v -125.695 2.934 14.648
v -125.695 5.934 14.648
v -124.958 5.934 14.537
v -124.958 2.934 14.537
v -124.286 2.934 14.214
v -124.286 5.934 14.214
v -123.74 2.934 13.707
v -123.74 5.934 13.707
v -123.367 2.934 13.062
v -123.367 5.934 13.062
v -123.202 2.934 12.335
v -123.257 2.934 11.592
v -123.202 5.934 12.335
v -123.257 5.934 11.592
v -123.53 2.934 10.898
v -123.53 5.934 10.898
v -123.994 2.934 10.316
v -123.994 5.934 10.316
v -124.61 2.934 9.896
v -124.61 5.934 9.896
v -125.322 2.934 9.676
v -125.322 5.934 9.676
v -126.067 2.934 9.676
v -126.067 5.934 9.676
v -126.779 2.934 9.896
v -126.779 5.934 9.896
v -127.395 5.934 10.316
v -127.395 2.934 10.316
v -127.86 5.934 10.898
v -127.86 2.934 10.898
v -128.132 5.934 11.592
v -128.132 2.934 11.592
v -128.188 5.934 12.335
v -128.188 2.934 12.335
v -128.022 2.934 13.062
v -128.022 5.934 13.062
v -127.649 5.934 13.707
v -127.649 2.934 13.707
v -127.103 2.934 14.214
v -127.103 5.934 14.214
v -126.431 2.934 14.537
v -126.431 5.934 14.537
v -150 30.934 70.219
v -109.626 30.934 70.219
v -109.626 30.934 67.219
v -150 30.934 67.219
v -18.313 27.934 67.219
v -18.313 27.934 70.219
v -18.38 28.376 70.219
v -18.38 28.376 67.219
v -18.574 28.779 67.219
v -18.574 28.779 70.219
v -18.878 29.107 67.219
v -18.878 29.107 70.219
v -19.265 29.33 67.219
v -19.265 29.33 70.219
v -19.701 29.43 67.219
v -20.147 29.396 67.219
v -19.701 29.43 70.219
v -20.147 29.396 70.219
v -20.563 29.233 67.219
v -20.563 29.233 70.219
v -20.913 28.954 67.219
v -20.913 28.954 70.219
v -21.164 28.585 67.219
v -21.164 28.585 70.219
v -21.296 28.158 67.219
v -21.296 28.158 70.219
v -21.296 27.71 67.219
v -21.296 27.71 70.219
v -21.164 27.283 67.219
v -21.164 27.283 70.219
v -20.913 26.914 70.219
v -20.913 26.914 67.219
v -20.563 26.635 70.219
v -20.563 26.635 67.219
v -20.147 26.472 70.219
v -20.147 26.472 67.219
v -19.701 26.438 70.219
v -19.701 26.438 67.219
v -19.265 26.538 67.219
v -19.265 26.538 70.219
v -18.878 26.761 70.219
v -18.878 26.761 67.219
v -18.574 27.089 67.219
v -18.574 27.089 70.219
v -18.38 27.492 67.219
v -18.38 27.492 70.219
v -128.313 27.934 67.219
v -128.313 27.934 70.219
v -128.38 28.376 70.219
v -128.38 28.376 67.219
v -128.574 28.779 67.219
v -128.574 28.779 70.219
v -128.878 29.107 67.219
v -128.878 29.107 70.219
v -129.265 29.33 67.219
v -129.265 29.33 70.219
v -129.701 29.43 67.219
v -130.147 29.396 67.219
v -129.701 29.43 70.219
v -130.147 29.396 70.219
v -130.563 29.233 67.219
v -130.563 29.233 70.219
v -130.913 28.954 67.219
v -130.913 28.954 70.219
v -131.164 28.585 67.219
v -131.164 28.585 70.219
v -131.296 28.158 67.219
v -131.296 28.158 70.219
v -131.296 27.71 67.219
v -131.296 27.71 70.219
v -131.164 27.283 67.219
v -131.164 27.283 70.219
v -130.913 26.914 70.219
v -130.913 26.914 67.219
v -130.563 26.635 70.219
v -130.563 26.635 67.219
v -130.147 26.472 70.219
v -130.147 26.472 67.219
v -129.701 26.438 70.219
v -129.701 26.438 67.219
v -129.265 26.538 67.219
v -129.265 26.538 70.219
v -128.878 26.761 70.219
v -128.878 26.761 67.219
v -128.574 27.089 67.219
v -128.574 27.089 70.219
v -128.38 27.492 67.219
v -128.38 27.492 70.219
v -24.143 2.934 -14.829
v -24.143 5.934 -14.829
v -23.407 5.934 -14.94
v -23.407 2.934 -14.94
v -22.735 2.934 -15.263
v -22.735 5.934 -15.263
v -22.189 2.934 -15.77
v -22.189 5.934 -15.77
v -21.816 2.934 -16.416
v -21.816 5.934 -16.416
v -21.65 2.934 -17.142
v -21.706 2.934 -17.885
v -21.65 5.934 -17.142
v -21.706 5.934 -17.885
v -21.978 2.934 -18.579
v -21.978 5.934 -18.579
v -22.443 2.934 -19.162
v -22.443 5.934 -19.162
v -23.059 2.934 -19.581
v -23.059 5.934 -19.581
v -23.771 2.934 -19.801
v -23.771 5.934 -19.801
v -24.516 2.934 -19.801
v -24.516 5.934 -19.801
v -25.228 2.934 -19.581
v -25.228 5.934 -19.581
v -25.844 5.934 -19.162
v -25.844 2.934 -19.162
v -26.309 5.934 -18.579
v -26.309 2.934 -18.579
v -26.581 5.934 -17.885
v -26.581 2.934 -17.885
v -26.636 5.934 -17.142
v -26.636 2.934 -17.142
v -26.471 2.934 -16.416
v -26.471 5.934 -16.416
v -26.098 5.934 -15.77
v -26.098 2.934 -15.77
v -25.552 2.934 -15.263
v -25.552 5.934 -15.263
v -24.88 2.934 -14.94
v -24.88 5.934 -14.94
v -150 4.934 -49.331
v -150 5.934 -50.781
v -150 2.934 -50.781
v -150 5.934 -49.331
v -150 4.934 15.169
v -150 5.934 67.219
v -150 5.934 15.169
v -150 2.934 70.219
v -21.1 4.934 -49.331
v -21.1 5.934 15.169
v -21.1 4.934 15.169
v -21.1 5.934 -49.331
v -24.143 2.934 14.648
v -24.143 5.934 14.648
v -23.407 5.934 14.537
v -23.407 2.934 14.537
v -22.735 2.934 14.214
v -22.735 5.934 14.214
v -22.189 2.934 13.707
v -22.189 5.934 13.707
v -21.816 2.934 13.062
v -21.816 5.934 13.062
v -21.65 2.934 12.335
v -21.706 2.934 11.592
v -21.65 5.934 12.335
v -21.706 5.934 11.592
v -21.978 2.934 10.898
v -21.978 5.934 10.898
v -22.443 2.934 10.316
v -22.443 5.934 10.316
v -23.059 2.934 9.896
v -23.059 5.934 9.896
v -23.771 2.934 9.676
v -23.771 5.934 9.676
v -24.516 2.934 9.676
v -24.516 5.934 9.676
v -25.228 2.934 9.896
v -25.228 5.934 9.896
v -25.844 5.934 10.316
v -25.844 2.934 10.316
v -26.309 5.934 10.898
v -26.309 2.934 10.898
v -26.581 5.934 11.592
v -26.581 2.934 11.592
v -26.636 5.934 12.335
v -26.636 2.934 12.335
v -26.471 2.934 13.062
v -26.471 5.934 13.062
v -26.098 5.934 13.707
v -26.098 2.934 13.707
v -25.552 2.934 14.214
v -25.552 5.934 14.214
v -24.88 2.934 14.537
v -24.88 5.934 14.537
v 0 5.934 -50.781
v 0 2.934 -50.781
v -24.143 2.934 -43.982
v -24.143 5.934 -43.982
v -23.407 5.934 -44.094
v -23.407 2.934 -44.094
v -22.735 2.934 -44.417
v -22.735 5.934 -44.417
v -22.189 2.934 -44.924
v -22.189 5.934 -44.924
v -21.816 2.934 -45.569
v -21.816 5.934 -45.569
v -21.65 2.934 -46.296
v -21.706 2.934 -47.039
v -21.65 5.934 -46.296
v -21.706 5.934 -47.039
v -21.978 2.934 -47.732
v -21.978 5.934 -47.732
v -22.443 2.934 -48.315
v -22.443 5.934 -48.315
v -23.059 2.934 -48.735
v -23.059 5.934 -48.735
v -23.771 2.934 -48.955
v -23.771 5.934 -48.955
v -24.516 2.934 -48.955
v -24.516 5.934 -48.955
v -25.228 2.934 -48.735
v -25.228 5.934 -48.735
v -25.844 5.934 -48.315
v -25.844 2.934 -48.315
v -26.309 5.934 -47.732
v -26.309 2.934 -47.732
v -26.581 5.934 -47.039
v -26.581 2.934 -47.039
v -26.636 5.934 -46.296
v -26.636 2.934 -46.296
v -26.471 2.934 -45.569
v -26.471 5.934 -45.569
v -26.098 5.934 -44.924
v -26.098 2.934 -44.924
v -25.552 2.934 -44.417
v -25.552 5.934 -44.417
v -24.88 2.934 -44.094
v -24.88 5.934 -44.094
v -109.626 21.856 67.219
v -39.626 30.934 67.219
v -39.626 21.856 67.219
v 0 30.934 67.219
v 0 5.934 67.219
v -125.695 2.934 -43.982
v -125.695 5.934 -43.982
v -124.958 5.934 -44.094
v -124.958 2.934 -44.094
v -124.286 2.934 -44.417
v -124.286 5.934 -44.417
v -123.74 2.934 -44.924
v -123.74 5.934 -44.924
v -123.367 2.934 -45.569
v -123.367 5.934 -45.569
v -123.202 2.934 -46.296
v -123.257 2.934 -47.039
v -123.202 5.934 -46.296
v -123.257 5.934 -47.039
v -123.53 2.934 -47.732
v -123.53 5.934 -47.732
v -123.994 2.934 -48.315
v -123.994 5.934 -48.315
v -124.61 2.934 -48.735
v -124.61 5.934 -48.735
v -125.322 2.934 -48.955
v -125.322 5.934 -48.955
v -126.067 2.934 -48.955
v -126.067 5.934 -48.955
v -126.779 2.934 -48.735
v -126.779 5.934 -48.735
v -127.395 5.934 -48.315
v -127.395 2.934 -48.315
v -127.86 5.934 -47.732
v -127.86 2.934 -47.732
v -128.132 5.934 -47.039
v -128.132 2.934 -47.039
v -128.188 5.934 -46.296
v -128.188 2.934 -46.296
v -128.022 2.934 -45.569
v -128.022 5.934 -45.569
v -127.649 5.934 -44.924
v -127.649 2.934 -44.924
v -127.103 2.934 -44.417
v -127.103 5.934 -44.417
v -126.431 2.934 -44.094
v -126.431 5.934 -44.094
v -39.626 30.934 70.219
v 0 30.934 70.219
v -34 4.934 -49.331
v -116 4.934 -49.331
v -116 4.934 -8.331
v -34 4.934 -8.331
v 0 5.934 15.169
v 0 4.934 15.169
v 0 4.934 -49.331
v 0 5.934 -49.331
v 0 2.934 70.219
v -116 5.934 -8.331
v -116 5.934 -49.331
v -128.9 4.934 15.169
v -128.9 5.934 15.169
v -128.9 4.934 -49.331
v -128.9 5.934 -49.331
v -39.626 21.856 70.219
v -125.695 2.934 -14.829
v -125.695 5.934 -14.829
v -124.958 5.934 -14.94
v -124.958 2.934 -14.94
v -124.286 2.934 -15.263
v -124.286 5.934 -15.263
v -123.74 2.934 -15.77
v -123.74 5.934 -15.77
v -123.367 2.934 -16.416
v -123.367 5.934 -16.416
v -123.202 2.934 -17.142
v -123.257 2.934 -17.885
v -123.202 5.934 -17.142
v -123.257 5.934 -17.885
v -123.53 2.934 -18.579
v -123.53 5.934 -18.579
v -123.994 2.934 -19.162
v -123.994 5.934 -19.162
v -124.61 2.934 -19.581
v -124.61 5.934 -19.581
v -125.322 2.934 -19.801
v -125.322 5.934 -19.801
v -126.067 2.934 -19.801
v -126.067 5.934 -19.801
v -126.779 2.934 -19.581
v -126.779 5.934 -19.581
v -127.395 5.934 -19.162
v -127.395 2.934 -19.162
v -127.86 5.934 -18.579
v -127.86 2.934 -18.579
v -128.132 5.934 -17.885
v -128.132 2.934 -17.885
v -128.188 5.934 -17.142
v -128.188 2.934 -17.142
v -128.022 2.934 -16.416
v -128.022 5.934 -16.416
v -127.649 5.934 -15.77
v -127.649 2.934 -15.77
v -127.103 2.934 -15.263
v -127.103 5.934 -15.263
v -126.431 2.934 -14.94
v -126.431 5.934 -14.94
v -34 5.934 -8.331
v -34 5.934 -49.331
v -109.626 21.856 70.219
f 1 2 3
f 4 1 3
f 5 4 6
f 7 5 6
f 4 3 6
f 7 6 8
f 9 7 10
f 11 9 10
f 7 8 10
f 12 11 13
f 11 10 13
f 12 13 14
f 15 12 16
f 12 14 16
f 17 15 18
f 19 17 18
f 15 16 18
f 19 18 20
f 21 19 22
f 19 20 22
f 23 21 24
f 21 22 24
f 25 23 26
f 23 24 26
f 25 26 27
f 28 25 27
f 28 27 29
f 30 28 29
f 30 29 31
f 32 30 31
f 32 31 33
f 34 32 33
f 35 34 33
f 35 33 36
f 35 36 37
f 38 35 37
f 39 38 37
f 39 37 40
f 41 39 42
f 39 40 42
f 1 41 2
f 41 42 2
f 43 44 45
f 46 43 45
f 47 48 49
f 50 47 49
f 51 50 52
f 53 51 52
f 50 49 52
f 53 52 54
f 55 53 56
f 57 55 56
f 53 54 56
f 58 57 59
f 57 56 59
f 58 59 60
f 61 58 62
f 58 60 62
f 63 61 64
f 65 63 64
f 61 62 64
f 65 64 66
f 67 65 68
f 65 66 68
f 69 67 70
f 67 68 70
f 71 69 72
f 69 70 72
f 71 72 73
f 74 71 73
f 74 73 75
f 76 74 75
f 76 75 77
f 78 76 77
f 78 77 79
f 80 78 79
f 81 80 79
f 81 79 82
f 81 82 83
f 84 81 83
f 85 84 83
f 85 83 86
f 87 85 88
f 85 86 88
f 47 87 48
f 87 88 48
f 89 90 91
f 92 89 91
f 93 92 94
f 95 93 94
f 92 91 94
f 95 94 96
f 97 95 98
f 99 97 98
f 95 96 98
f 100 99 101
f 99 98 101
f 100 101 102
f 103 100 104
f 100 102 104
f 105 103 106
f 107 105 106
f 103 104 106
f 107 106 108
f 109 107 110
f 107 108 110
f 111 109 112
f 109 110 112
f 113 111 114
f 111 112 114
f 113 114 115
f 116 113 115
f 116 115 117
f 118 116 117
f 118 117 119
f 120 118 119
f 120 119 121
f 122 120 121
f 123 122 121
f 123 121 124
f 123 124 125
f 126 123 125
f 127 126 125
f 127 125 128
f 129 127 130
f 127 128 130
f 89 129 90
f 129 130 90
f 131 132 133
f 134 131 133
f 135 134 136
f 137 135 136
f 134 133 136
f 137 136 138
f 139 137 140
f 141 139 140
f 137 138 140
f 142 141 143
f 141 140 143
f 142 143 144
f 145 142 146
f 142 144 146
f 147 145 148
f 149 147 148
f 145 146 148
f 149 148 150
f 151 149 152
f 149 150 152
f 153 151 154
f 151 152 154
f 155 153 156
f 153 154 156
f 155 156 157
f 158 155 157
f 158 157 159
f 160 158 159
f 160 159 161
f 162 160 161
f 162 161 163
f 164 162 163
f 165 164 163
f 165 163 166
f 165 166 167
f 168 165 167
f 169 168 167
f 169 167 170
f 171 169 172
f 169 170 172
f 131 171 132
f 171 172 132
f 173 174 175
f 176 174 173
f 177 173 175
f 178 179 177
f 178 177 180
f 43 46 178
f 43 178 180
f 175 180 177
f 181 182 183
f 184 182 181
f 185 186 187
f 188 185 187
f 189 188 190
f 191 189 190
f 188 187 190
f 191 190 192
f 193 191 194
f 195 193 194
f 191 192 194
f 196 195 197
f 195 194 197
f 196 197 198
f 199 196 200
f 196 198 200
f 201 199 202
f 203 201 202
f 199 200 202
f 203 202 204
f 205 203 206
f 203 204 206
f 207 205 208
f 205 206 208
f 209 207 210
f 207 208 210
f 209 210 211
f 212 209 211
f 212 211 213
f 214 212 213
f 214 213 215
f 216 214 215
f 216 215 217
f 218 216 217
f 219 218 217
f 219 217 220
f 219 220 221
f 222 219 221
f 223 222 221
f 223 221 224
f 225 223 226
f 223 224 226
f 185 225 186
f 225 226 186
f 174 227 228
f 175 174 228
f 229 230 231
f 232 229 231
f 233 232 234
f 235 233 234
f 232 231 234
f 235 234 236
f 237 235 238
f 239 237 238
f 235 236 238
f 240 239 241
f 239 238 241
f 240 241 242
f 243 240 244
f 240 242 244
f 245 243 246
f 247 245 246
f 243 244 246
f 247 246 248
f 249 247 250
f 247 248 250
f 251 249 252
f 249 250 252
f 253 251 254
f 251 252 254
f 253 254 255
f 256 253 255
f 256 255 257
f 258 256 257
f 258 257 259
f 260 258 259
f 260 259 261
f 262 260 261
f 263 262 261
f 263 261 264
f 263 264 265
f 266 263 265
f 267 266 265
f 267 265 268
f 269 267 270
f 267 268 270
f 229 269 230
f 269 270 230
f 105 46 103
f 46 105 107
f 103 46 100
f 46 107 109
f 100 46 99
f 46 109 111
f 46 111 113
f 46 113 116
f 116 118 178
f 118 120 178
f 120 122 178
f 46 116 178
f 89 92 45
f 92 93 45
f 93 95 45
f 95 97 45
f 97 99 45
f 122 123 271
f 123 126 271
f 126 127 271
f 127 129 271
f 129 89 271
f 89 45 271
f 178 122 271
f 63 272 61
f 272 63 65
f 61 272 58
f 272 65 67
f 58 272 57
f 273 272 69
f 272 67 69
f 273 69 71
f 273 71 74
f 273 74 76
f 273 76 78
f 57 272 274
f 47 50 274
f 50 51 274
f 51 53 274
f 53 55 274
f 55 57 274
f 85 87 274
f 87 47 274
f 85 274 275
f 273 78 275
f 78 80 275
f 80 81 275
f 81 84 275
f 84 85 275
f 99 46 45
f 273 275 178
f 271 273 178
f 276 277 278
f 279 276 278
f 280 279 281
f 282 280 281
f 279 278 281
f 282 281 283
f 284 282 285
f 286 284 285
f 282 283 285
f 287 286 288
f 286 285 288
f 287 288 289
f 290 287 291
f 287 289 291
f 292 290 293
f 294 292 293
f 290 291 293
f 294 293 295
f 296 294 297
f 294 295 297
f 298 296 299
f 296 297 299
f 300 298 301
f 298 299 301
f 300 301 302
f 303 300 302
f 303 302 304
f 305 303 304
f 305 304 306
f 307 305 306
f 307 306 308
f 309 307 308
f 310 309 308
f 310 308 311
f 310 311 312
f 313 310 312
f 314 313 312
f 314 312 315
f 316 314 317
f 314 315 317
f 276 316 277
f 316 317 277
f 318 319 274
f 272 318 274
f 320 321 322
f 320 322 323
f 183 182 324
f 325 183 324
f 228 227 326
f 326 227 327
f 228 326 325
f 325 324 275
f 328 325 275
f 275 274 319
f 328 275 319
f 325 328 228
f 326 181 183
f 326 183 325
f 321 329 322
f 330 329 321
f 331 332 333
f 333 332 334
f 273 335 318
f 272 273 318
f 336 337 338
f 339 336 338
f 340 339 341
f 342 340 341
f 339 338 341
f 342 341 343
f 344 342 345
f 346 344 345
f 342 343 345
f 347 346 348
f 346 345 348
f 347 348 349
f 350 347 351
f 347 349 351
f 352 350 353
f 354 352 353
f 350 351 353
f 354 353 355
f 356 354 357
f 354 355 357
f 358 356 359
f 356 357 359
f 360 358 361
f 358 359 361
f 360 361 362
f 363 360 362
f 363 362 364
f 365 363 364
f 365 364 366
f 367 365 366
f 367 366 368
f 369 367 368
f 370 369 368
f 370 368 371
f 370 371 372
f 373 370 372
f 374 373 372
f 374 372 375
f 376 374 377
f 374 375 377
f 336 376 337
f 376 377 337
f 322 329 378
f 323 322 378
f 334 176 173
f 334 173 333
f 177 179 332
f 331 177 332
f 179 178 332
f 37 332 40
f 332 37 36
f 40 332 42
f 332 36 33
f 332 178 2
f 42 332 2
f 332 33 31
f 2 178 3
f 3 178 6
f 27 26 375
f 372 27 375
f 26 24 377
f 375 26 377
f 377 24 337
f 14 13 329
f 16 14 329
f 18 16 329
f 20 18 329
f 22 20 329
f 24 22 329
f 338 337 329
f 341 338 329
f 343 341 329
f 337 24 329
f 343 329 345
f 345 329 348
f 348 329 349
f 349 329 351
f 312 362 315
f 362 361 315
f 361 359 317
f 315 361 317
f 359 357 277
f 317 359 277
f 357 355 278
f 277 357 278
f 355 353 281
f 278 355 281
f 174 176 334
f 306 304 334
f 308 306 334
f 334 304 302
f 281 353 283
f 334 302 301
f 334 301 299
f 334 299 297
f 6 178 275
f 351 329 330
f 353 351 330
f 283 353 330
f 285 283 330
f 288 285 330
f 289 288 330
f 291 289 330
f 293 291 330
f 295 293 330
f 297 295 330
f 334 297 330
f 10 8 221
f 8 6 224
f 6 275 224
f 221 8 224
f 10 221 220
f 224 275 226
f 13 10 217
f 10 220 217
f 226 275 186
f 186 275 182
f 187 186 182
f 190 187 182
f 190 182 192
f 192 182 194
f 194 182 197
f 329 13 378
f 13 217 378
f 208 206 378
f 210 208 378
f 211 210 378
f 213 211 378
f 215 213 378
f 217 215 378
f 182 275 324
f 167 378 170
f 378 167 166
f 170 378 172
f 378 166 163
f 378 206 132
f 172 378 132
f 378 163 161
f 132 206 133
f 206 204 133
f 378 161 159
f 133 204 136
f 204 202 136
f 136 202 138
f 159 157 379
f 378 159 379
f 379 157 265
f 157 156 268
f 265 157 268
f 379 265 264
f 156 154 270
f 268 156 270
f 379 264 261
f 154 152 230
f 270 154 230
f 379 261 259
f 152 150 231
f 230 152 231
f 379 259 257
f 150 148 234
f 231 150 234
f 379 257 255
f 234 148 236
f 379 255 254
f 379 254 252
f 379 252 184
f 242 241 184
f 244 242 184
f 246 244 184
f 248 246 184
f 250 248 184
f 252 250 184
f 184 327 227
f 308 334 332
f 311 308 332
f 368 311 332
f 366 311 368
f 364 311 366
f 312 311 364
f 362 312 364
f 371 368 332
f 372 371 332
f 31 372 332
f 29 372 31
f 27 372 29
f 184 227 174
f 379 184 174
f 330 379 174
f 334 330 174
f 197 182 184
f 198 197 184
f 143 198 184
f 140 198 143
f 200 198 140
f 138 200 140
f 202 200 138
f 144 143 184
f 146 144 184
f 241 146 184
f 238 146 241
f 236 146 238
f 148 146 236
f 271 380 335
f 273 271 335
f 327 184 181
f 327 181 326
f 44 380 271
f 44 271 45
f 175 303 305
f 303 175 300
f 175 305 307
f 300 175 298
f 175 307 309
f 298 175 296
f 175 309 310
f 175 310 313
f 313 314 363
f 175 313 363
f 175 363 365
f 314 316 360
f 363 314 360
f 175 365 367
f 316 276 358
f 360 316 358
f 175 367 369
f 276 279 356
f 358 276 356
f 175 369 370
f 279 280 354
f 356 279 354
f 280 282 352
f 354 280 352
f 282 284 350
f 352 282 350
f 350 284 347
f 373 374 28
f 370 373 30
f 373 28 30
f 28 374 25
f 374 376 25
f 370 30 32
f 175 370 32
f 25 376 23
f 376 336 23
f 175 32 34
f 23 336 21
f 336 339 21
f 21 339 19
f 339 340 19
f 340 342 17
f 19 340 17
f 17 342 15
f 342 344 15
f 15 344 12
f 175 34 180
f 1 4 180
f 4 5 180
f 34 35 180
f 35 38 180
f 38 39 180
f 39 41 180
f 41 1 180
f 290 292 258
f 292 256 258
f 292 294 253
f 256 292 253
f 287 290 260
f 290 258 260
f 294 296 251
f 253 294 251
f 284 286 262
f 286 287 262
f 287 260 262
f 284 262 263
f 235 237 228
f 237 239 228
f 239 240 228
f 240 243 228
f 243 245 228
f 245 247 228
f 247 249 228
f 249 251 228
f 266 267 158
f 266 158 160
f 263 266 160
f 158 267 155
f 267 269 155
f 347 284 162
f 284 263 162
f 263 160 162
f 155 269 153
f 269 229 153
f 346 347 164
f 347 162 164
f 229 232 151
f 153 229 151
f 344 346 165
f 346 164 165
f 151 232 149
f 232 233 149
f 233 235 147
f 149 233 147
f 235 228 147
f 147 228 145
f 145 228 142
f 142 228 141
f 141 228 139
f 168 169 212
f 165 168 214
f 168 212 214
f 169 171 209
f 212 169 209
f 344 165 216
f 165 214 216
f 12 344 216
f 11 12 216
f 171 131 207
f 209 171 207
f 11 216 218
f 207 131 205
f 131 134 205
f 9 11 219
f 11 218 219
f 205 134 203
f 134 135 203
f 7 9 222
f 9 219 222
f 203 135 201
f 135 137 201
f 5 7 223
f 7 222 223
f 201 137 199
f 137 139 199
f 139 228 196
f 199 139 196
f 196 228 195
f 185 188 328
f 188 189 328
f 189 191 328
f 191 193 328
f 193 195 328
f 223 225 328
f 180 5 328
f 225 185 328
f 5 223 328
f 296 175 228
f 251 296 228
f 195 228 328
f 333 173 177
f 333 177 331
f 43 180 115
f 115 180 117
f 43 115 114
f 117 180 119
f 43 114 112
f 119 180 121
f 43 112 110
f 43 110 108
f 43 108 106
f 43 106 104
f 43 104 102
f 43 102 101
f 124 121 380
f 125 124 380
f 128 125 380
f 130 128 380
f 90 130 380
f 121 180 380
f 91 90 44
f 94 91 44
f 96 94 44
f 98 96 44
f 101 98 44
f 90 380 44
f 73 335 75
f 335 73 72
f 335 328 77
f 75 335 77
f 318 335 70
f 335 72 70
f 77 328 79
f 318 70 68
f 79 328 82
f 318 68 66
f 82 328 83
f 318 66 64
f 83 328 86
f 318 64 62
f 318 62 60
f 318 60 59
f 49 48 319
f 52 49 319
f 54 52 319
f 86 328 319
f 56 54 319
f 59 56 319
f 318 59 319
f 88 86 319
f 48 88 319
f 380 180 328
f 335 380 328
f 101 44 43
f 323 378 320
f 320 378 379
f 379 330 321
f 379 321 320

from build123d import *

# Parameters (mm, degrees)
BOSS_EXTRUDE1_DEPTH = 150
SKETCH2_W           = 70
SKETCH2_H           = 9.077653183
CUT_EXTRUDE2_DEPTH  = 3
SKETCH3_W           = 21.1
SKETCH3_H           = 64.5
CUT_EXTRUDE3_DEPTH  = 1
SKETCH4_W           = 82
SKETCH4_H           = 41
CUT_EXTRUDE4_DEPTH  = 1
SKETCH5_R           = 2.5
CUT_EXTRUDE5_DEPTH  = 3
SKETCH6_R           = 1.5
CUT_EXTRUDE6_DEPTH  = 3


with BuildPart() as part:
    # Sketch1 → Boss-Extrude1 (new body)
    with BuildSketch(Plane(origin=(0, 0, 0), x_dir=(0, 0, -1), z_dir=(1, 0, 0))):
        Polygon((-70.218878969, 2.934000234), (-70.218878969, 30.934000234), (-67.218878969, 30.934000234), (-67.218878969, 5.934000234), (50.781121031, 5.934000234), (50.781121031, 2.934000234), align=None)
    extrude(amount=-BOSS_EXTRUDE1_DEPTH)

    # Sketch2 → Cut-Extrude2 (cut)
    with BuildSketch(Plane.XY.offset(70.218878969)):
        with Locations((-74.626034168, 26.395173643)):
            Rectangle(SKETCH2_W, SKETCH2_H)
    extrude(amount=-CUT_EXTRUDE2_DEPTH, mode=Mode.SUBTRACT)

    # Sketch3 → Cut-Extrude3 (cut)
    with BuildSketch(Plane(origin=(0, 5.934000234, 0), x_dir=(1, 0, 0), z_dir=(0, 1, 0))):
        with Locations((-10.55, 17.081121031)):
            Rectangle(SKETCH3_W, SKETCH3_H)
        with Locations((-139.45, 17.081121031)):
            Rectangle(SKETCH3_W, SKETCH3_H)
    extrude(amount=-CUT_EXTRUDE3_DEPTH, mode=Mode.SUBTRACT)

    # Sketch4 → Cut-Extrude4 (cut)
    with BuildSketch(Plane(origin=(0, 5.934000234, 0), x_dir=(1, 0, 0), z_dir=(0, 1, 0))):
        with Locations((-75, 28.831121031)):
            Rectangle(SKETCH4_W, SKETCH4_H)
    extrude(amount=-CUT_EXTRUDE4_DEPTH, mode=Mode.SUBTRACT)

    # Sketch5 → Cut-Extrude5 (cut)
    with BuildSketch(Plane(origin=(0, 5.934000234, 0), x_dir=(1, 0, 0), z_dir=(0, 1, 0))):
        with Locations(Location((-24.143437735, -12.14833258, 0), (0, 0, 270))):
            Circle(SKETCH5_R)
        with Locations(Location((-24.143437735, 46.482481241, 0), (0, 0, 270))):
            Circle(SKETCH5_R)
        with Locations(Location((-24.143437735, 17.329037904, 0), (0, 0, 270))):
            Circle(SKETCH5_R)
        with Locations(Location((-125.69459869, 46.482481241, 0), (0, 0, 270))):
            Circle(SKETCH5_R)
        with Locations(Location((-125.69459869, 17.329037904, 0), (0, 0, 270))):
            Circle(SKETCH5_R)
        with Locations(Location((-125.69459869, -12.14833258, 0), (0, 0, 270))):
            Circle(SKETCH5_R)
    extrude(amount=-CUT_EXTRUDE5_DEPTH, mode=Mode.SUBTRACT)

    # Sketch6 → Cut-Extrude6 (cut)
    with BuildSketch(Plane.XY.offset(70.218878969)):
        with Locations((-129.813017084, 27.934000234)):
            Circle(SKETCH6_R)
        with Locations((-19.813017084, 27.934000234)):
            Circle(SKETCH6_R)
    extrude(amount=-CUT_EXTRUDE6_DEPTH, mode=Mode.SUBTRACT)


solid = part.part
